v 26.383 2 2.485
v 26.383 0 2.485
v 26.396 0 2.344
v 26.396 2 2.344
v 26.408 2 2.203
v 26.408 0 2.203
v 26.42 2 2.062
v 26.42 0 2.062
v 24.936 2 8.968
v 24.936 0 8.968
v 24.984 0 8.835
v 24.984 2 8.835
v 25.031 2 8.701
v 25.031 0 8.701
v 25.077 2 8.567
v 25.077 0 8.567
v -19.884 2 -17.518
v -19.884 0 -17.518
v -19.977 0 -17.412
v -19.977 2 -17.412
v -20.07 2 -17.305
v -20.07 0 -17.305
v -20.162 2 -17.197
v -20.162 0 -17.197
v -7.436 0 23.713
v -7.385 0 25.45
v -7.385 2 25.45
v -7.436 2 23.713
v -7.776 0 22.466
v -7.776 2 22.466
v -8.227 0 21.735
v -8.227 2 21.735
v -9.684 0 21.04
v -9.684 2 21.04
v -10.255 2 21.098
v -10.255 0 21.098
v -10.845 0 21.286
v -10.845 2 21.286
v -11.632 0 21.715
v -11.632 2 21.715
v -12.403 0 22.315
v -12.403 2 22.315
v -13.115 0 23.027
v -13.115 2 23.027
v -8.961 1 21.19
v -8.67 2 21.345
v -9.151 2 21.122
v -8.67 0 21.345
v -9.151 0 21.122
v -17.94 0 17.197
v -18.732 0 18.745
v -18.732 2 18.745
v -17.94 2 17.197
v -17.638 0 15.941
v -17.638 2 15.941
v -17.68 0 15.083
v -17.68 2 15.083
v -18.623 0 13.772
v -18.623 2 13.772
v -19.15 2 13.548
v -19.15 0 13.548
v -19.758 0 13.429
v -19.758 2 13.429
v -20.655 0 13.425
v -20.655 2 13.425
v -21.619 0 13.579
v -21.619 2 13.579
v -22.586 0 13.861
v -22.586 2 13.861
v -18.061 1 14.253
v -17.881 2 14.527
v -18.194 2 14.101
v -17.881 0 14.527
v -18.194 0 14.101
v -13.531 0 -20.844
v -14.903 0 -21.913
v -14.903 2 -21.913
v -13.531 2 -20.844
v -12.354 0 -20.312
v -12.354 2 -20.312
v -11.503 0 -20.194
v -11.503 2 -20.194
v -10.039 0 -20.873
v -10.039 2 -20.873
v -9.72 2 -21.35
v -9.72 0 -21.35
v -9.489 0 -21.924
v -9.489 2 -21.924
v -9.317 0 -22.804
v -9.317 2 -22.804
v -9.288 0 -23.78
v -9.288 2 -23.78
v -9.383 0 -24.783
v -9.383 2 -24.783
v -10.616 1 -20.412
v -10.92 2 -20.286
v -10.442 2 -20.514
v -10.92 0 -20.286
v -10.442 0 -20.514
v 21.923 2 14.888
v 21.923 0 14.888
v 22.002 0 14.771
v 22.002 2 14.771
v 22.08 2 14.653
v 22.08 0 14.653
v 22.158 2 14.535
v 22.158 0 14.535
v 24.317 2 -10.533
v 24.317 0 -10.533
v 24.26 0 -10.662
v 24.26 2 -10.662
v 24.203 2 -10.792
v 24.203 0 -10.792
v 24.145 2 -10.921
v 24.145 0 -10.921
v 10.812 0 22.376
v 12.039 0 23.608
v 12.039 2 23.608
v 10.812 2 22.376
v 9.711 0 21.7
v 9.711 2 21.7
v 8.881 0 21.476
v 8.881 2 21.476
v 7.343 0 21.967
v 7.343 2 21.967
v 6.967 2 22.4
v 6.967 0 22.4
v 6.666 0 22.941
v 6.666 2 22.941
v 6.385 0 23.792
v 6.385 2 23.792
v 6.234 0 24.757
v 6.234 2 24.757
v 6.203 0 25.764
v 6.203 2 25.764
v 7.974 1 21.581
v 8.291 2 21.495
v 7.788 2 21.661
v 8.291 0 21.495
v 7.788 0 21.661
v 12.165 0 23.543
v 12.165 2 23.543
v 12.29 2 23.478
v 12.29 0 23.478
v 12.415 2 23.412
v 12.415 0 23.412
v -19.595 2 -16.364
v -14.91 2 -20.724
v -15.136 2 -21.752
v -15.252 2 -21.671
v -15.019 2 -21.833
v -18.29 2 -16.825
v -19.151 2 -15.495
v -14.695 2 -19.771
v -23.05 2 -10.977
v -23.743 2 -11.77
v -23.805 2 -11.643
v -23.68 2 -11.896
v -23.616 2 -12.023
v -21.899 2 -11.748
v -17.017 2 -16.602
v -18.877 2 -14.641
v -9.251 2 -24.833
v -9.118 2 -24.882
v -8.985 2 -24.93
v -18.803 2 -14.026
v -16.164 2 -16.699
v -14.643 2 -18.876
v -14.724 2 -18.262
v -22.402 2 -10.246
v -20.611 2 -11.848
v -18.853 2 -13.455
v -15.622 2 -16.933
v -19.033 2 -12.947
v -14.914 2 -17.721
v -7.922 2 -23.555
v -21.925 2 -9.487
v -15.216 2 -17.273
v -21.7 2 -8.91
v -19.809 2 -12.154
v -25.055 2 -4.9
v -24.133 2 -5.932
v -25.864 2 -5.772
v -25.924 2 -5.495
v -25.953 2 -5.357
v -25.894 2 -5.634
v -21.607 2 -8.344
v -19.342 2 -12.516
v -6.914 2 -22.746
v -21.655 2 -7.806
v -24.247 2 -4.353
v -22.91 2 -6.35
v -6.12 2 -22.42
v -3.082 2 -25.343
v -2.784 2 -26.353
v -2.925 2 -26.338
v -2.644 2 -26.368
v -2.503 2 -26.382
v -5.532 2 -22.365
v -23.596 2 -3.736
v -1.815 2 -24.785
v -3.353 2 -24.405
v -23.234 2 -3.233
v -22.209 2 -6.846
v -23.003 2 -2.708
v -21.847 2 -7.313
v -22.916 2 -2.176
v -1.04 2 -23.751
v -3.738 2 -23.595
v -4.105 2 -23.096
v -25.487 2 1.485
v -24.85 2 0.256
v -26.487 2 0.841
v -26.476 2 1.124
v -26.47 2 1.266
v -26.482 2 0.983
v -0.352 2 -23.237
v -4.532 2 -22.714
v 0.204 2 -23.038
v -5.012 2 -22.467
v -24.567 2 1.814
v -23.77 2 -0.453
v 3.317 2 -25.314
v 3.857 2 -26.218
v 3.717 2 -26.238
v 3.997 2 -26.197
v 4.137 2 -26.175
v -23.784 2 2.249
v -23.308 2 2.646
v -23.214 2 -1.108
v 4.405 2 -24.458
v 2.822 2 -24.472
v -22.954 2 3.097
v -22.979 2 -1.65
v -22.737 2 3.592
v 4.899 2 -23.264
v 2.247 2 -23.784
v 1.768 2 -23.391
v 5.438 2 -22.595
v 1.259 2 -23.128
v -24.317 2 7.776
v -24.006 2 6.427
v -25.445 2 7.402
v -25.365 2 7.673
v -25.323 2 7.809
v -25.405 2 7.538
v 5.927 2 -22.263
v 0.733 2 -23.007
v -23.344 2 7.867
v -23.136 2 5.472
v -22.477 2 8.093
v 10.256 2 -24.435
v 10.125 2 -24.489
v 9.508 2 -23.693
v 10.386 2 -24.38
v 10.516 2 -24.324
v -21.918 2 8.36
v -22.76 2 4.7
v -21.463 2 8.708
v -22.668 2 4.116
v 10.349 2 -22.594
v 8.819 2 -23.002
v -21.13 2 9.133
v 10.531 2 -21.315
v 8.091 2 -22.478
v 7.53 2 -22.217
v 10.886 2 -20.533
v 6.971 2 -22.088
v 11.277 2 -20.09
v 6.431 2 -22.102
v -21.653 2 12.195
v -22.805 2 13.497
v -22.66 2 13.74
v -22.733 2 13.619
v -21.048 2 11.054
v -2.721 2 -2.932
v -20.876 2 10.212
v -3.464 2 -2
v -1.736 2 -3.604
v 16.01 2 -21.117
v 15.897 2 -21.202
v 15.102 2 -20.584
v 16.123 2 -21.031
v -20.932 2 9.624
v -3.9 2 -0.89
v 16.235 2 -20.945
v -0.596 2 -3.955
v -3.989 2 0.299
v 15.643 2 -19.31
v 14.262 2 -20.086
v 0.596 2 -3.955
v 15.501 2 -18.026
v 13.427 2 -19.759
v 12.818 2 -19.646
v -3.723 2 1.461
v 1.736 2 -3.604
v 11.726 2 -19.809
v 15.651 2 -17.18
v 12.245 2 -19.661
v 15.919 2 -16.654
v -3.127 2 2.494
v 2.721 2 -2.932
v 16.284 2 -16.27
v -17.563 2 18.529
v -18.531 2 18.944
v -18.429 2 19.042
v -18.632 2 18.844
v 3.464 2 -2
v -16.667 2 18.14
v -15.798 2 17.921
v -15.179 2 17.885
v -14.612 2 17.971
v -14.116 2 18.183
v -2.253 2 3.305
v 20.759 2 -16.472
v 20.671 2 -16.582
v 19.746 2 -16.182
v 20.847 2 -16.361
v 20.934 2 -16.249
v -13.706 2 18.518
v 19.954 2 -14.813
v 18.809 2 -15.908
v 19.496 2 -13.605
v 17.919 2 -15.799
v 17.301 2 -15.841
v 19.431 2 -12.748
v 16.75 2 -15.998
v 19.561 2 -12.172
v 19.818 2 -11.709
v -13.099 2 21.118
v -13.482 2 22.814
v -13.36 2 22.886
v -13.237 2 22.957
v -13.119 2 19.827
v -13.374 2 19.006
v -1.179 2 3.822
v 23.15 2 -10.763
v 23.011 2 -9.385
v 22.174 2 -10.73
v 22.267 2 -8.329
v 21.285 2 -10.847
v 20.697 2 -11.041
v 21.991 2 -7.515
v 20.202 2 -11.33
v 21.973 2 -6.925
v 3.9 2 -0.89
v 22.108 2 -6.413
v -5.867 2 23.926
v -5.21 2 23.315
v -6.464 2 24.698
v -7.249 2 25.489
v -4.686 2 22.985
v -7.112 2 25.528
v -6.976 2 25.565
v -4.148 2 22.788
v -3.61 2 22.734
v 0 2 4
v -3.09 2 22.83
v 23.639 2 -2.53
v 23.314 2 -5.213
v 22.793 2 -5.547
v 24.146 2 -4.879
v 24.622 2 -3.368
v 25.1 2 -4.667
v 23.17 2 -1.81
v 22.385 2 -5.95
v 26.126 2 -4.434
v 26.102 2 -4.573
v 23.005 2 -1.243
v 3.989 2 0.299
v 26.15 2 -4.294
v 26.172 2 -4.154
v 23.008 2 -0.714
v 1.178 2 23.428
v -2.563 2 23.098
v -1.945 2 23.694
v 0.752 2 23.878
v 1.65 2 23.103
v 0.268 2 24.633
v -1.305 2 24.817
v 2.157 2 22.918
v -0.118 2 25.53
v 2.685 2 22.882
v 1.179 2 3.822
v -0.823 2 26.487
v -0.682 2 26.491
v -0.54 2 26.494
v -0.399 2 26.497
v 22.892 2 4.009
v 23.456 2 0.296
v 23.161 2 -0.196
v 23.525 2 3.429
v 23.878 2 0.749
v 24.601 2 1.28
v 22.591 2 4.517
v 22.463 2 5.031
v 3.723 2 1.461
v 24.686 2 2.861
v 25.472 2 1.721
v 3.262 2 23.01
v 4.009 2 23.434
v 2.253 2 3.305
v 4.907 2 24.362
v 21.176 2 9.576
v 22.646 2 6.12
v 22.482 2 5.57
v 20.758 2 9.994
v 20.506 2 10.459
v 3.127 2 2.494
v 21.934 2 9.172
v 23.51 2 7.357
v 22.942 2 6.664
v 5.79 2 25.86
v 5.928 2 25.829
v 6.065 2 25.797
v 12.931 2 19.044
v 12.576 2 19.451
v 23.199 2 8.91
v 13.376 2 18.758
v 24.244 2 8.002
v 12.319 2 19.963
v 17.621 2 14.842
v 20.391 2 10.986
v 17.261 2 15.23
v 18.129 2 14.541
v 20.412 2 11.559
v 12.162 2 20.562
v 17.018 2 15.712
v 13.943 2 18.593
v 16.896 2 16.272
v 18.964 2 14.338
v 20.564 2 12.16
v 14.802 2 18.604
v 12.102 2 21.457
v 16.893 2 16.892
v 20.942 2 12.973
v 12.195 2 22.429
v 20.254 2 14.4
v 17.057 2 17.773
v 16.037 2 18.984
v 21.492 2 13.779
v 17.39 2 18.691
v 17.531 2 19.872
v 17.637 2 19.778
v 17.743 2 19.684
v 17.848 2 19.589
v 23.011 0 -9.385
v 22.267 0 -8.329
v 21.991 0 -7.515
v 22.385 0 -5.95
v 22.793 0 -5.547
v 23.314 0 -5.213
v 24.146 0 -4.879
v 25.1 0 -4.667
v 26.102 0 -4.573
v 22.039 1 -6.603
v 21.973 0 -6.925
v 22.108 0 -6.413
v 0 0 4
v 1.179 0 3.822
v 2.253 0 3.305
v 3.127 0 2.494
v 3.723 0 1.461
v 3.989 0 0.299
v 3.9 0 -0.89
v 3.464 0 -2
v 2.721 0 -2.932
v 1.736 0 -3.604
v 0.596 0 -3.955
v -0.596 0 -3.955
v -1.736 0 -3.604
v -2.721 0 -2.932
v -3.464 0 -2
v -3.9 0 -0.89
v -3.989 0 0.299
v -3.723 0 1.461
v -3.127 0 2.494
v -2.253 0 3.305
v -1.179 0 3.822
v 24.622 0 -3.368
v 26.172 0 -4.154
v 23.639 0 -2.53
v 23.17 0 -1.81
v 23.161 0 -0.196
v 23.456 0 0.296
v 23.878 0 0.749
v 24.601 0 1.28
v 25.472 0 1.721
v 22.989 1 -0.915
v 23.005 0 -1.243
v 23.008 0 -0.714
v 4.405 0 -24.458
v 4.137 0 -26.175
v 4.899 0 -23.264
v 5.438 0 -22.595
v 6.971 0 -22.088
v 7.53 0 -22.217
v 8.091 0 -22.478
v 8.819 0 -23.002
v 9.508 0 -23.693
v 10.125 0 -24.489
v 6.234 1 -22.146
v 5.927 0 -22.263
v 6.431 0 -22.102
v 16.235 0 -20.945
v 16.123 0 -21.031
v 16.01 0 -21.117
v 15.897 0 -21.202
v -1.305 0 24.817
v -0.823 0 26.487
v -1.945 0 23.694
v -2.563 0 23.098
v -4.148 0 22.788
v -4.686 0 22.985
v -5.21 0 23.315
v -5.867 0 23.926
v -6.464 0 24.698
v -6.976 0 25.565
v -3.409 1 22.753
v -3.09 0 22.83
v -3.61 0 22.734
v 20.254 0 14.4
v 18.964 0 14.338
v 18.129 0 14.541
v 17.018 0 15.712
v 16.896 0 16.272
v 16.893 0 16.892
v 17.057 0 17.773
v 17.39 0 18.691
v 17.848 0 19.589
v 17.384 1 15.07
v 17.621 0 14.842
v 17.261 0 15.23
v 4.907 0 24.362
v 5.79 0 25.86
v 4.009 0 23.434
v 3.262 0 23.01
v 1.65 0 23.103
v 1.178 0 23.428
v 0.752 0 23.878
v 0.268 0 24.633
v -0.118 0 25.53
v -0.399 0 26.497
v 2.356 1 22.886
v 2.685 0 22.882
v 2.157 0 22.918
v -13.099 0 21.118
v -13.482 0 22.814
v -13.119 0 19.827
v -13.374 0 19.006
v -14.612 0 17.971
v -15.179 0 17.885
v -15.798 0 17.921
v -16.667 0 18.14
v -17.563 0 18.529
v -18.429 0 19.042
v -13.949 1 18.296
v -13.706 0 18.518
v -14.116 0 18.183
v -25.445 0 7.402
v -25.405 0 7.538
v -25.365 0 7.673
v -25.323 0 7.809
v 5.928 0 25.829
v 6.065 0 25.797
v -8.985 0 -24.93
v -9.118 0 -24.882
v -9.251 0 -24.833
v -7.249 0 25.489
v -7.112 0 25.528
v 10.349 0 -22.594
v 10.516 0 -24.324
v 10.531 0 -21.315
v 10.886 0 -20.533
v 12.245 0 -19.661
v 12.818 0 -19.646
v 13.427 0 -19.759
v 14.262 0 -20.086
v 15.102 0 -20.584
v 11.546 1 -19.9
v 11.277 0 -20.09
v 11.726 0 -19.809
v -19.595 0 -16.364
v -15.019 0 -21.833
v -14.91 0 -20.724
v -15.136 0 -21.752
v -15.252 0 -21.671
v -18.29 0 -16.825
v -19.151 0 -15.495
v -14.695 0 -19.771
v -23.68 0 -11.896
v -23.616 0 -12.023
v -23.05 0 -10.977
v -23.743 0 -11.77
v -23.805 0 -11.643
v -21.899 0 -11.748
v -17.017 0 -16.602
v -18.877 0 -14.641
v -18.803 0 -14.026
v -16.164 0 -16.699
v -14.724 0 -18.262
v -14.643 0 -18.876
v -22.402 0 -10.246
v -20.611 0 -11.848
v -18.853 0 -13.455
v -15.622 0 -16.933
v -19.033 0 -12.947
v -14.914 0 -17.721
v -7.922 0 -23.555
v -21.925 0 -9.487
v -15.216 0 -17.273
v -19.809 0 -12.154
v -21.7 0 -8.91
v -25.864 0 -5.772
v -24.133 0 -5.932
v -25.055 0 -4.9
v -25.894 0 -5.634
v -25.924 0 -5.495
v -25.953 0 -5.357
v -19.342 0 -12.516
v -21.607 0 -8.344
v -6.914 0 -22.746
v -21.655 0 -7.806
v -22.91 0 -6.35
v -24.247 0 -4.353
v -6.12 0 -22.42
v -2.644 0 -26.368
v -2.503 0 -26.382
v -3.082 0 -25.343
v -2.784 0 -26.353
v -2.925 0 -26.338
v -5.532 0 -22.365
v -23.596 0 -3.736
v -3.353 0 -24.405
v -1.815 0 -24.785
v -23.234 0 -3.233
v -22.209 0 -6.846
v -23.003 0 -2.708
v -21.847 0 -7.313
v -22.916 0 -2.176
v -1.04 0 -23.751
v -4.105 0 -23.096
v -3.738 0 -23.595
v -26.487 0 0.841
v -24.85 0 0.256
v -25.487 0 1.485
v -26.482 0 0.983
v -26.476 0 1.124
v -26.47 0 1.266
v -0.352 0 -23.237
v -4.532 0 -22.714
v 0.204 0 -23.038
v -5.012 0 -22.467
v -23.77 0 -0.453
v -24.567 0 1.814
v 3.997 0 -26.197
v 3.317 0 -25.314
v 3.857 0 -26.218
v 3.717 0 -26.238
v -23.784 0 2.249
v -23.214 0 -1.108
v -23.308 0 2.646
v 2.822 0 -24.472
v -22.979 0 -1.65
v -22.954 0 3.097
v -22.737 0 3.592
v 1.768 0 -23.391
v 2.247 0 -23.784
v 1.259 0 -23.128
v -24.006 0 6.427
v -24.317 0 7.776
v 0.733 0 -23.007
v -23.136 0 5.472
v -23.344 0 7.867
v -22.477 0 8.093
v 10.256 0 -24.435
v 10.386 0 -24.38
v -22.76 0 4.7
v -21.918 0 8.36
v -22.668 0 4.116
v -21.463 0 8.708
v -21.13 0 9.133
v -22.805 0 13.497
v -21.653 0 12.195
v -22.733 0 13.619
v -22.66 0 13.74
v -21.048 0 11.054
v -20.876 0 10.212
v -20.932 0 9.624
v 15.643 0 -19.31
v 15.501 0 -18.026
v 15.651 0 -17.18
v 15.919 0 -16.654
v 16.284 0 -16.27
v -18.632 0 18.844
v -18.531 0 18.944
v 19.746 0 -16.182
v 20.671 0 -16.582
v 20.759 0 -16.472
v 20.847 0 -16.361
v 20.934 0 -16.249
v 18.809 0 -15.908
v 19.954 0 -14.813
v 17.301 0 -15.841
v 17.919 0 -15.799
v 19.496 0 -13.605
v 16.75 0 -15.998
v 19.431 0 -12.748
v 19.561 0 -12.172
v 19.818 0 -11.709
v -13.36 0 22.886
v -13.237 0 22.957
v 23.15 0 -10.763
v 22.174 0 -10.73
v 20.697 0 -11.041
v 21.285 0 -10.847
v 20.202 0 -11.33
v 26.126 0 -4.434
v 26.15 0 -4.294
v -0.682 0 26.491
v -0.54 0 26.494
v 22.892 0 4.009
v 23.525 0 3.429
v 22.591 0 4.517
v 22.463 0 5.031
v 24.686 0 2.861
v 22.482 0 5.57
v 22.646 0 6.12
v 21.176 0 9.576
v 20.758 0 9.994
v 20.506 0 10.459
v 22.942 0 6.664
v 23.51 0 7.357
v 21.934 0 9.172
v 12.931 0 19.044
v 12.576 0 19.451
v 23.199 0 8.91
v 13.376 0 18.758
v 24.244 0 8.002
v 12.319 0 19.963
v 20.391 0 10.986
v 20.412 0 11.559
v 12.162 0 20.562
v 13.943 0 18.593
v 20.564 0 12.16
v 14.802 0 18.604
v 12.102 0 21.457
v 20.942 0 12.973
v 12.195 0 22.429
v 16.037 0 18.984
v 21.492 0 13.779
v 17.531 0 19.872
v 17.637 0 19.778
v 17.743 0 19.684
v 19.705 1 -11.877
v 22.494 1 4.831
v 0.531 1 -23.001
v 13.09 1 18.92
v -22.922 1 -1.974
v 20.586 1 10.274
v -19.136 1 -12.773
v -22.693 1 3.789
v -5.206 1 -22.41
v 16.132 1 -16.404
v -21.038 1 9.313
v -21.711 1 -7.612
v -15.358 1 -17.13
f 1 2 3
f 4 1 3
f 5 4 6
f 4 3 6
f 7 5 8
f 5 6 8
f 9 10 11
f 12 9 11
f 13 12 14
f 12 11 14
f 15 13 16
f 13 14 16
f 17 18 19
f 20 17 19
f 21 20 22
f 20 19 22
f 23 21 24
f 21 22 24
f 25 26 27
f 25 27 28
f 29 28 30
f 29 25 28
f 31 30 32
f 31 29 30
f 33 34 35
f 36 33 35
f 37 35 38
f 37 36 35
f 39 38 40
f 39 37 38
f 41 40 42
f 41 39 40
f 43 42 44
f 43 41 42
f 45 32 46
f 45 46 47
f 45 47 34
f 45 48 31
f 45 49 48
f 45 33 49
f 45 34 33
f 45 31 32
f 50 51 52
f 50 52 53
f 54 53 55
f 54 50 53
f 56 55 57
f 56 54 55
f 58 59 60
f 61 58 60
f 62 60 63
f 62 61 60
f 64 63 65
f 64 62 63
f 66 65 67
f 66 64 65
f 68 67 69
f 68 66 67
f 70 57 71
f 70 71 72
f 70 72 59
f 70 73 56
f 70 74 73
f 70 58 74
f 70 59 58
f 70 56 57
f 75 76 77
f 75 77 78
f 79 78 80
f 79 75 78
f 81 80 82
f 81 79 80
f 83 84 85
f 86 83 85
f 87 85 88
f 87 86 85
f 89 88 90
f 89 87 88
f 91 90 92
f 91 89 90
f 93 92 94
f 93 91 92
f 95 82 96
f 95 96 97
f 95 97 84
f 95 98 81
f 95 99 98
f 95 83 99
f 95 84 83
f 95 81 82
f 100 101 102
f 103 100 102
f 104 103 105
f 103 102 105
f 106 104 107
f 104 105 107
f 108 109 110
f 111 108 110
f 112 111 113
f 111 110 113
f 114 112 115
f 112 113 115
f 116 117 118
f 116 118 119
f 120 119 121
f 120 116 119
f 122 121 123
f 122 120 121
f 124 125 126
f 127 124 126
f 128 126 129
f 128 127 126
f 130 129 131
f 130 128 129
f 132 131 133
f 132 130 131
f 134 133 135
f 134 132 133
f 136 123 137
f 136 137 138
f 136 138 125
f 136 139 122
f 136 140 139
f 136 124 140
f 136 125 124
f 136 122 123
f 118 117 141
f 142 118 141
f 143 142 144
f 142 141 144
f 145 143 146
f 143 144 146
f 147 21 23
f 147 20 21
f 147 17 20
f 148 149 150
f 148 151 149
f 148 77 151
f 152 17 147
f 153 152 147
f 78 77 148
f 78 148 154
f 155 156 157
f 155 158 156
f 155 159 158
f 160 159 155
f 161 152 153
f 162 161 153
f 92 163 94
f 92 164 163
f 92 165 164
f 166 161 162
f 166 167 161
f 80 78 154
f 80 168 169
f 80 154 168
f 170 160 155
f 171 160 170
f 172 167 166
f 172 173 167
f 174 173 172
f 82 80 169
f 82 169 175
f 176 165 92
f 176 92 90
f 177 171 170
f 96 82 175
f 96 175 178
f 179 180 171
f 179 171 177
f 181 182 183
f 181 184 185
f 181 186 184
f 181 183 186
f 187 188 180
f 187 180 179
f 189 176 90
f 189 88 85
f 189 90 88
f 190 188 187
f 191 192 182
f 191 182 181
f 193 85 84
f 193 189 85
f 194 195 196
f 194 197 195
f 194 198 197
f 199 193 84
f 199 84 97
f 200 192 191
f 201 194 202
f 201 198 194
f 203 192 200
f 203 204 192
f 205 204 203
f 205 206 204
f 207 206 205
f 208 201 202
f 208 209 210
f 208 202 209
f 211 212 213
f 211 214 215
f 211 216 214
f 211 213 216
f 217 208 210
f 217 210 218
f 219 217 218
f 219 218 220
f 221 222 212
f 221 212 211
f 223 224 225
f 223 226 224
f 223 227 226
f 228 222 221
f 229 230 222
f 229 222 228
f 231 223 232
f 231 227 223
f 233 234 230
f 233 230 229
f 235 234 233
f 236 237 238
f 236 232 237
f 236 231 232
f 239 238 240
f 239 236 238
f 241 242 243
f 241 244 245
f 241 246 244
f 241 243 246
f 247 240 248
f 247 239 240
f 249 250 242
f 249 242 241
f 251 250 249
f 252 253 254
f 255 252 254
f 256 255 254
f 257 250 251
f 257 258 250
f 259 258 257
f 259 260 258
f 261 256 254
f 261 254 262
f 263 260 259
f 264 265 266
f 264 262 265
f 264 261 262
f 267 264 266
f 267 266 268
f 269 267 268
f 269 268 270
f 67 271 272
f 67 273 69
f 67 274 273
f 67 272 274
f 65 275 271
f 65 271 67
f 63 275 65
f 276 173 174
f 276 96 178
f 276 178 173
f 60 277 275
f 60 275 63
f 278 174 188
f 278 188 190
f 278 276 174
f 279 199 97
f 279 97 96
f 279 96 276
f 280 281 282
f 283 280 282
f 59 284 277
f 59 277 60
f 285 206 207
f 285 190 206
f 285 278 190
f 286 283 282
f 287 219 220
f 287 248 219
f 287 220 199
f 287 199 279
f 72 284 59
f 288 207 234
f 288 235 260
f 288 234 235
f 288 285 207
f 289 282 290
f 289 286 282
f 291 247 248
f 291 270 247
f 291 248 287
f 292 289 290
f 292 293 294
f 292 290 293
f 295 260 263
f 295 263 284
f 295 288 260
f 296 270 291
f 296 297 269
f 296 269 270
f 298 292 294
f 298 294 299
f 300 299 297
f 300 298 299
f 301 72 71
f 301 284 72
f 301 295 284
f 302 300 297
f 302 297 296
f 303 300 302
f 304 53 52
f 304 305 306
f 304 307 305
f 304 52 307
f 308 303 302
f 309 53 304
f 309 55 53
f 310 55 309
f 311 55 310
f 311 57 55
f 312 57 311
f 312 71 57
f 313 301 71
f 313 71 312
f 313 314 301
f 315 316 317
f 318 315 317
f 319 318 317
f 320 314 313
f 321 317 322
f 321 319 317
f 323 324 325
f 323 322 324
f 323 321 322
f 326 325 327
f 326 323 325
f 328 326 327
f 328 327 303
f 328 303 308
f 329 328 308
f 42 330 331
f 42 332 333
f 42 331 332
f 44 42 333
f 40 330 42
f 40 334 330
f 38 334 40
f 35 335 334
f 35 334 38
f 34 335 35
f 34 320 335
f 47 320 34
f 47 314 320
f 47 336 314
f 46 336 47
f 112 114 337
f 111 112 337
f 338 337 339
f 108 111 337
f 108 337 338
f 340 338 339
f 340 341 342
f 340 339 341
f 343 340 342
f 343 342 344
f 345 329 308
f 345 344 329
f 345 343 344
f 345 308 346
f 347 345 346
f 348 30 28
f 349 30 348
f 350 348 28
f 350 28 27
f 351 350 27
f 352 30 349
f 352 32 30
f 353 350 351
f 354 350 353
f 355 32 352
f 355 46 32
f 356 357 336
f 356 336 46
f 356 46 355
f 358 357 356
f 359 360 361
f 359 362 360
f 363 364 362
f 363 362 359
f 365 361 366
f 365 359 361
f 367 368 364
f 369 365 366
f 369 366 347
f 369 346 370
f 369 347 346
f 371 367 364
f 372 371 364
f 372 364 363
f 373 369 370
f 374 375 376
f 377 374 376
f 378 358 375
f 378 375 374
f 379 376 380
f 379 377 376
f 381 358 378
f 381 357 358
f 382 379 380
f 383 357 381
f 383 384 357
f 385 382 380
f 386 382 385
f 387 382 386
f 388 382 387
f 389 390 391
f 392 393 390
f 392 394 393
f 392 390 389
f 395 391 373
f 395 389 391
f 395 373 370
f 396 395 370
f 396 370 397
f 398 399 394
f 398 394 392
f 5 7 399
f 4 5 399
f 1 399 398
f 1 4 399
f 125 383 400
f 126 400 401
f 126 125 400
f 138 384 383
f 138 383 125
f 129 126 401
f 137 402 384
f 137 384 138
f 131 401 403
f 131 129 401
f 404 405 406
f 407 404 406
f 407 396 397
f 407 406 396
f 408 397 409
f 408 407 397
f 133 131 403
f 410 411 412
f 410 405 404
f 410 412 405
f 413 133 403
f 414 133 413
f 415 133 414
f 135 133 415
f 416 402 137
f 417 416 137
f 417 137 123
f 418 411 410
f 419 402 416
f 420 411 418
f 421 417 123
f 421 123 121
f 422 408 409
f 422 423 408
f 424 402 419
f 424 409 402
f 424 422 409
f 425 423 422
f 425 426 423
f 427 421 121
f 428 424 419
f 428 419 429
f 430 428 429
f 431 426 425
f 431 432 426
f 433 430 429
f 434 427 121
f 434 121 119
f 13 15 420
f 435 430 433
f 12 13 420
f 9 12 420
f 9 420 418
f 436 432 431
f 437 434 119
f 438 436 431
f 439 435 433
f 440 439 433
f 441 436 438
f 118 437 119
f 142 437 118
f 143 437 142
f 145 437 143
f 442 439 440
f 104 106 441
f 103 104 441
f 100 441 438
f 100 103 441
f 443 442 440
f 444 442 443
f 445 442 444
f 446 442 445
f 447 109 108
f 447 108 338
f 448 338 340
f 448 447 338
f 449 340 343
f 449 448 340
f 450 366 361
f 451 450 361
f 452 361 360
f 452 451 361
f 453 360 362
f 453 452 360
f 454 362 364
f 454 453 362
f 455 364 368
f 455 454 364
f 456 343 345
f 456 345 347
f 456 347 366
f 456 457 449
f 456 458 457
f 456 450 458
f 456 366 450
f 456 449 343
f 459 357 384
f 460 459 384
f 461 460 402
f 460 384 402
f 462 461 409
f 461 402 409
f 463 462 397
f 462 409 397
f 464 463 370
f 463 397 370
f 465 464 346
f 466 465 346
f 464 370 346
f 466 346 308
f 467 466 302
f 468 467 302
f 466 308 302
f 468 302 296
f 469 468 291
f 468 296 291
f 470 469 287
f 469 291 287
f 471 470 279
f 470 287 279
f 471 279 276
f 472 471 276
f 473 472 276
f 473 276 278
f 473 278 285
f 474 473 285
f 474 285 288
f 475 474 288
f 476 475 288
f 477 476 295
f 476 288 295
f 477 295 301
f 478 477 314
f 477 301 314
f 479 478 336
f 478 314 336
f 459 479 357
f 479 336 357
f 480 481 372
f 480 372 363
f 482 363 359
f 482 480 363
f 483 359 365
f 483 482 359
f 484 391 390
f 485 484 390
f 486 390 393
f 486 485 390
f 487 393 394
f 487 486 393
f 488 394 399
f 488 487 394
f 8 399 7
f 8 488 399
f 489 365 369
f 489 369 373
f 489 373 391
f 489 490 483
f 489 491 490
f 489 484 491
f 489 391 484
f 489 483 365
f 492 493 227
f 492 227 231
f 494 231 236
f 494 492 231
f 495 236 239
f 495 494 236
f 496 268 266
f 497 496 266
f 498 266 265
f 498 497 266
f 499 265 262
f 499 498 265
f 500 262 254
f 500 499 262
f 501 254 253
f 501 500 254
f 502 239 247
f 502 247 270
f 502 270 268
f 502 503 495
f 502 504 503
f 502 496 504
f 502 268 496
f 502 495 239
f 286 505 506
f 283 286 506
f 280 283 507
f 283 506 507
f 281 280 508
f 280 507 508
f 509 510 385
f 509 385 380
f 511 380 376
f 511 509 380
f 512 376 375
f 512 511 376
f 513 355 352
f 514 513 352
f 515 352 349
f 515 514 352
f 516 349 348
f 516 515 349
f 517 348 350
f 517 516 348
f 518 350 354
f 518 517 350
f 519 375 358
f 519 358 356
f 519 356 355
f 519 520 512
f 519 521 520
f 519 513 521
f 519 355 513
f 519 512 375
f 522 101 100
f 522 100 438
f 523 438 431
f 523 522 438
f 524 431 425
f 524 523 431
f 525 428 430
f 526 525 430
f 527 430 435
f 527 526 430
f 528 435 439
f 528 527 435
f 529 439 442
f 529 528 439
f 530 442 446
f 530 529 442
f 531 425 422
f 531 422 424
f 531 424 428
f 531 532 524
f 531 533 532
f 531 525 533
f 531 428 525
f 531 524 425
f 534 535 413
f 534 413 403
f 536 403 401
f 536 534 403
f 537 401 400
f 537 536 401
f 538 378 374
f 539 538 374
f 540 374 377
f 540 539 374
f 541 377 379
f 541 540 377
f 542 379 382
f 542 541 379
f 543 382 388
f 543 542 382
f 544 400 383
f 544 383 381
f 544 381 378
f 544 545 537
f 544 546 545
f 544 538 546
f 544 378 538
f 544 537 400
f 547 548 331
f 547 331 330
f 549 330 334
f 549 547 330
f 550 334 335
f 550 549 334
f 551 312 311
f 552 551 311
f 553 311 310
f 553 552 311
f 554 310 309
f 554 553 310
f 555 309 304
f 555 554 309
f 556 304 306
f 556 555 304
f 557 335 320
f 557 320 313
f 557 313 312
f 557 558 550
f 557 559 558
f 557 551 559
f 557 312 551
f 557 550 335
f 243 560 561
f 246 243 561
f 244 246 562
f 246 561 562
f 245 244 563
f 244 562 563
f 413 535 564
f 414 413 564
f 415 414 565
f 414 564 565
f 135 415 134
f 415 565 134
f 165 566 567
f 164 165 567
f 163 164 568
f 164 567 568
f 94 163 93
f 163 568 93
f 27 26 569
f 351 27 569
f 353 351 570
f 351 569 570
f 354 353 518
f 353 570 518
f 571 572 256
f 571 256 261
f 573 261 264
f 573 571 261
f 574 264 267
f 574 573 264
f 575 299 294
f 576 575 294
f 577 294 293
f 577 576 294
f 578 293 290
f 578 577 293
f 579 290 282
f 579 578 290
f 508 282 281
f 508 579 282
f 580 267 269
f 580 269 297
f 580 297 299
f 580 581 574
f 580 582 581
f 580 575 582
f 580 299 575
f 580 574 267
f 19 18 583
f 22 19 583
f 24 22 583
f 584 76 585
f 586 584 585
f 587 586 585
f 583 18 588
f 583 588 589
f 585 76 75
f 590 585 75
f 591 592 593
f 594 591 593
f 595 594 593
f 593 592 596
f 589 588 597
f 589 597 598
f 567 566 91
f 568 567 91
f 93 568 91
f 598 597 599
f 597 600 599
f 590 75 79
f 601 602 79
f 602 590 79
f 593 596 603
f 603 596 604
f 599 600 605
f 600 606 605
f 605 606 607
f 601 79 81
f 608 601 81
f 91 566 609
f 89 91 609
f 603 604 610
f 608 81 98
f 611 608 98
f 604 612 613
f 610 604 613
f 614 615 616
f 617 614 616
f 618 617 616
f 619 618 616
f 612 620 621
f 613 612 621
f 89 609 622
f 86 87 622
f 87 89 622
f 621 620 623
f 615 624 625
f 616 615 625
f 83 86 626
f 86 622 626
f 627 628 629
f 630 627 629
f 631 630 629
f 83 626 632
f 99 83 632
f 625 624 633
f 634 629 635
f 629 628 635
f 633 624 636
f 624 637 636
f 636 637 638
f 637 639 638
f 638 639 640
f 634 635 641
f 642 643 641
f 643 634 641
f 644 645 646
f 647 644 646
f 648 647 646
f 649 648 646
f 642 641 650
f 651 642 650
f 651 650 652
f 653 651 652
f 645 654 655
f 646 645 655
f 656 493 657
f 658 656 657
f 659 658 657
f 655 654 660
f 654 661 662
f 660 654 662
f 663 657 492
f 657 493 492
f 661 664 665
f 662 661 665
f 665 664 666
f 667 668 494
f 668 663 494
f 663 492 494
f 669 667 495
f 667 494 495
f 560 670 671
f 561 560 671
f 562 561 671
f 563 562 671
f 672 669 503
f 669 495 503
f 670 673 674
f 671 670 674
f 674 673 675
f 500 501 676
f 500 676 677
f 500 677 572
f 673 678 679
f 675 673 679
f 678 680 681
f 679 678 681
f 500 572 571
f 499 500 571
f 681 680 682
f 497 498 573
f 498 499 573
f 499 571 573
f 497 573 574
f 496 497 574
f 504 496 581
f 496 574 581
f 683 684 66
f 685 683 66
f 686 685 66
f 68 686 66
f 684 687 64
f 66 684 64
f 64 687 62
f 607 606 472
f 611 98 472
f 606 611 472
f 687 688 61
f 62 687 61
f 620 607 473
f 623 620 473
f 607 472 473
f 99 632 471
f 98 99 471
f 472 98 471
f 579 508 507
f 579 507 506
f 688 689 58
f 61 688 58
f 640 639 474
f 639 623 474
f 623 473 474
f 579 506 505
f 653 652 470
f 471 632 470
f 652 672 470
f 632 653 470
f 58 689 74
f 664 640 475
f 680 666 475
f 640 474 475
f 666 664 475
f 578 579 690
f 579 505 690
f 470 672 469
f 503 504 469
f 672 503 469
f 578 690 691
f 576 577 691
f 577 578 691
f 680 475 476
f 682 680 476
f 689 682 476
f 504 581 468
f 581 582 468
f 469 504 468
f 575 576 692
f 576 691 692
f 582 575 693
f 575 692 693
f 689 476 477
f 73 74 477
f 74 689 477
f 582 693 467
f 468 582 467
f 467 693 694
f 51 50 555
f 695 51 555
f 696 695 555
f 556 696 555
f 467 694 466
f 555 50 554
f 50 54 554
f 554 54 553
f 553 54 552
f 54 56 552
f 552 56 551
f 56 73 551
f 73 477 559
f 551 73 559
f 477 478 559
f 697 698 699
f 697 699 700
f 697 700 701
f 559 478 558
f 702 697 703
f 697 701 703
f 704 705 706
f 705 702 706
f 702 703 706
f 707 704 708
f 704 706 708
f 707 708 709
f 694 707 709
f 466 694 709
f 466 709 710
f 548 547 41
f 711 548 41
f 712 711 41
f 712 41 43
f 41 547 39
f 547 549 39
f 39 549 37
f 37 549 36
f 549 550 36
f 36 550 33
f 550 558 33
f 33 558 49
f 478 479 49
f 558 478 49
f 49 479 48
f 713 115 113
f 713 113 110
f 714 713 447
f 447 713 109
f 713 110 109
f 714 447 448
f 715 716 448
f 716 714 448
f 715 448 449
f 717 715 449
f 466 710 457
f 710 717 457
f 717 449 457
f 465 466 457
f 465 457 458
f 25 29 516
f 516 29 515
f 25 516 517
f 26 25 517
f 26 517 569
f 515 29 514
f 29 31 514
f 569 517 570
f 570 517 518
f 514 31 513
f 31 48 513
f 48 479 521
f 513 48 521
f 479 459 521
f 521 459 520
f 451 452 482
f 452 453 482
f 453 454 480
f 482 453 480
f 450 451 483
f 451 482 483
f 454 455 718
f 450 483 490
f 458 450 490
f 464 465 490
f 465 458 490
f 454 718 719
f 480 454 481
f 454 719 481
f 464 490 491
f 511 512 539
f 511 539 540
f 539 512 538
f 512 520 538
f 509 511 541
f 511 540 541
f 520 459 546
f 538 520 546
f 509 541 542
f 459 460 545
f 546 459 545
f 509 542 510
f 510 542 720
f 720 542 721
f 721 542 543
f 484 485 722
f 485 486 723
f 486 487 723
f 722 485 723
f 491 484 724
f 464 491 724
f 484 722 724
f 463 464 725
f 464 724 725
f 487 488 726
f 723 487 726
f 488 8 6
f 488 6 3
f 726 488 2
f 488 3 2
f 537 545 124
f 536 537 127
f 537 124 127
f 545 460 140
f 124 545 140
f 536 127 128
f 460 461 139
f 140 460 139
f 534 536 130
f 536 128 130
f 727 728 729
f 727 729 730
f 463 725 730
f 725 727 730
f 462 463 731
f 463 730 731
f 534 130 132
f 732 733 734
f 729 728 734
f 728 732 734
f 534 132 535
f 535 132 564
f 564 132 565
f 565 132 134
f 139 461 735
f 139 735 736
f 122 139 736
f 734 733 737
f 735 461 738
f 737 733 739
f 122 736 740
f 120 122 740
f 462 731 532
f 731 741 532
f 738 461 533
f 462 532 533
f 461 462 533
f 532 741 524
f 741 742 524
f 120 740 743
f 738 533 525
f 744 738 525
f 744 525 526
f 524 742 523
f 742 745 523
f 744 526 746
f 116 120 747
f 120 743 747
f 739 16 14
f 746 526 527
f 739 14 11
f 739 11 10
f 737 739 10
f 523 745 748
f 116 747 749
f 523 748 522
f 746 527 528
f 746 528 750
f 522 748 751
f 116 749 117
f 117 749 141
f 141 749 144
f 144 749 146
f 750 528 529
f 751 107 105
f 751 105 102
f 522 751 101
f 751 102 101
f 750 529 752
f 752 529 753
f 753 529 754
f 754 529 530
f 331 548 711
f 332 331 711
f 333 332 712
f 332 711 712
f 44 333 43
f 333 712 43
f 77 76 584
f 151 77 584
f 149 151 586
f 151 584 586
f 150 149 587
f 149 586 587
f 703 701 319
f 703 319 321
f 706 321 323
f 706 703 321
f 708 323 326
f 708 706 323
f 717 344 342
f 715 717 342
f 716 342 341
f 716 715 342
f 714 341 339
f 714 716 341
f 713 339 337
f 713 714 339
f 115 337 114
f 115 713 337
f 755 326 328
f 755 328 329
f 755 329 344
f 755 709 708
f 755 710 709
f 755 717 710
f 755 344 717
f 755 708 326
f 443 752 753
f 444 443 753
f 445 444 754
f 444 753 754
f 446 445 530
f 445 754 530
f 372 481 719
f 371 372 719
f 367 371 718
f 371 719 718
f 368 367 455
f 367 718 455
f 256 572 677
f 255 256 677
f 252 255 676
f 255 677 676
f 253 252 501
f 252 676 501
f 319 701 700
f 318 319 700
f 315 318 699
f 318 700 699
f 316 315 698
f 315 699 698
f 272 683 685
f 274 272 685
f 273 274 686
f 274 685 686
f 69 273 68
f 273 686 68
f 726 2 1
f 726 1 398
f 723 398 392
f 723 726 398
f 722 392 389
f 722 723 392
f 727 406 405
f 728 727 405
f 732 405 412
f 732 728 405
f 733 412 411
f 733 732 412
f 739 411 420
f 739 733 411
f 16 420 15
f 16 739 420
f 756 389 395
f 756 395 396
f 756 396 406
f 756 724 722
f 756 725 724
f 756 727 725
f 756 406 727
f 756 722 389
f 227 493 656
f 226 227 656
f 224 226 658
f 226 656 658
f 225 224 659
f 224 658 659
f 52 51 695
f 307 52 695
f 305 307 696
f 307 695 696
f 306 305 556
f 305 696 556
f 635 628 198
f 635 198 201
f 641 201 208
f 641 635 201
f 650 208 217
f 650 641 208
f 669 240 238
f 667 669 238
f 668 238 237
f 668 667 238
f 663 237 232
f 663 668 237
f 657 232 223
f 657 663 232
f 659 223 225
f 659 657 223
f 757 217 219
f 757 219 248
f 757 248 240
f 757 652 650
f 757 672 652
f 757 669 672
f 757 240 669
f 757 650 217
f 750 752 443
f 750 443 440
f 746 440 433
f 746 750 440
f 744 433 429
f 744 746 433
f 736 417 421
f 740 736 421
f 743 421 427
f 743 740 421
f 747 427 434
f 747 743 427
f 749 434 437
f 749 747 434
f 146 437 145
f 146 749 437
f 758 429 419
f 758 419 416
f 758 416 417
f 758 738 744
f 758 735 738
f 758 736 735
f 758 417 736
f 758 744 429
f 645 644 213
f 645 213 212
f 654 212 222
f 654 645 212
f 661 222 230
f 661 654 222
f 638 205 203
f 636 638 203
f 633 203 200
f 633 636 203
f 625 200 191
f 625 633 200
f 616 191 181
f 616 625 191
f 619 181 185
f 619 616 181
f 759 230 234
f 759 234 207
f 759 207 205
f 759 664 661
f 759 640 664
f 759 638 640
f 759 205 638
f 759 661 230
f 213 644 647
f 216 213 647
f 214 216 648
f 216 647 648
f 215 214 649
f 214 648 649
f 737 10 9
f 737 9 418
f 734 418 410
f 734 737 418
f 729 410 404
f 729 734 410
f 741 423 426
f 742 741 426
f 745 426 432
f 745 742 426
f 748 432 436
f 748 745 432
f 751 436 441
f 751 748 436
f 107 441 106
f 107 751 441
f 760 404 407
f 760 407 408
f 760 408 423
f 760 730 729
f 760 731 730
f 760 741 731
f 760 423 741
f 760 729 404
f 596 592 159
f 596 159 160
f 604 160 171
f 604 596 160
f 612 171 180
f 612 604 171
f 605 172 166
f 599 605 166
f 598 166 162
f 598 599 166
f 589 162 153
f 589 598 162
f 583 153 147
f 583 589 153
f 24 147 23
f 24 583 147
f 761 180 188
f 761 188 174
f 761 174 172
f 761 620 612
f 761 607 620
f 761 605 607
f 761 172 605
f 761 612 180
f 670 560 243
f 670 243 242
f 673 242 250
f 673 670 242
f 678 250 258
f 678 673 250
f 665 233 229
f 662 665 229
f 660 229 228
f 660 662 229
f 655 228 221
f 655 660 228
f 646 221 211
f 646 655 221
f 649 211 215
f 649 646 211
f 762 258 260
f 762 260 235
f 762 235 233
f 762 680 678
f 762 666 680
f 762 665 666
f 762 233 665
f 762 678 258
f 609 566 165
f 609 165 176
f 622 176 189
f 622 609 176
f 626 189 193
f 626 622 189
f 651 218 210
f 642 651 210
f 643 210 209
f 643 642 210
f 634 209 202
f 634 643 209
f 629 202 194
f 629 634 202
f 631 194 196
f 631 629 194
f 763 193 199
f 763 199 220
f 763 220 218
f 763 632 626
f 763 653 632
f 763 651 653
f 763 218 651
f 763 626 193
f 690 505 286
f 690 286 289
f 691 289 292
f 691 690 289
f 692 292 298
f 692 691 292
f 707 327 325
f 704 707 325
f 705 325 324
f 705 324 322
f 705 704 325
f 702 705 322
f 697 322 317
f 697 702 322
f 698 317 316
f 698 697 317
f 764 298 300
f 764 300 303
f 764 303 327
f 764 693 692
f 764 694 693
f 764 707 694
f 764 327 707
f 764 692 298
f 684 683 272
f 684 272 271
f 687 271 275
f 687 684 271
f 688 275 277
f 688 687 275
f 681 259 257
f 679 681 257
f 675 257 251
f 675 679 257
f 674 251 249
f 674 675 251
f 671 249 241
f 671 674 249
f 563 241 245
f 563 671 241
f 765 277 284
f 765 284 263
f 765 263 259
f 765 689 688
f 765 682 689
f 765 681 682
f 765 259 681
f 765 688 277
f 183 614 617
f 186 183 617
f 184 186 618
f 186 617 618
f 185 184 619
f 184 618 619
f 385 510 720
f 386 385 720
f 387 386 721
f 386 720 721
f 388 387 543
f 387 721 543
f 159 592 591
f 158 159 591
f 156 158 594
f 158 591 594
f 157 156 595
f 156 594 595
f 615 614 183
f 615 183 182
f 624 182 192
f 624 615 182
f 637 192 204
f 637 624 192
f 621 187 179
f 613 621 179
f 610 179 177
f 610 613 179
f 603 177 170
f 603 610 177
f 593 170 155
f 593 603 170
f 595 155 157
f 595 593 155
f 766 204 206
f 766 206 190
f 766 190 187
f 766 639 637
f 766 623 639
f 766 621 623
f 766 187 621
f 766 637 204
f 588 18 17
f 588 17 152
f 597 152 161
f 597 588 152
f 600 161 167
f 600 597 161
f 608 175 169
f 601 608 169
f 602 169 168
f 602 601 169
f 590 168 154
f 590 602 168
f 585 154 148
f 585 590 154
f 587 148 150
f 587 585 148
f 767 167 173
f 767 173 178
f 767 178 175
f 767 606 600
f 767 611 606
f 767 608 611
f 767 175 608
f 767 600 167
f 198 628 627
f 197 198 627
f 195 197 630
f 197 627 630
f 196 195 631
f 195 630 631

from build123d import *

# Parameters (mm, degrees)
SKETCH1_R           = 26.5
BOSS_EXTRUDE1_DEPTH = 2
CUT_EXTRUDE1_START  = -2
CUT_EXTRUDE1_DEPTH  = 2
CIRPATTERN2_COUNT   = 25
SKETCH4_R           = 4
CUT_EXTRUDE2_DEPTH  = 2


with BuildPart() as part:
    # Sketch1 → Boss-Extrude1 (new body)
    with BuildSketch(Plane(origin=(0, 0, 0), x_dir=(1, 0, 0), z_dir=(0, 1, 0))):
        with Locations(Location((0, 0, 0), (0, 0, 270))):
            Circle(SKETCH1_R)
    extrude(amount=BOSS_EXTRUDE1_DEPTH)

    # Sketch2 → Cut-Extrude1 (cut)
    with BuildSketch(Plane(origin=(0, 2, 0), x_dir=(1, 0, 0), z_dir=(0, 1, 0)).offset(CUT_EXTRUDE1_START)):
        with BuildLine():
            ThreePointArc((20.67056927, 16.582447529), (18.581221902, 18.894131169), (16.234972011, 20.944586026))
            add(Edge.make_bspline(
                [(16.234972011, 20.944586026), (12.135241932, 12.33960038), (20.67056927, 16.582447529)],
                knots=[0, 0, 0, 1, 1, 1], degree=2, weights=[1, 0.580612476, 1]))
        make_face()
    cut_extrude1 = extrude(amount=CUT_EXTRUDE1_DEPTH, mode=Mode.SUBTRACT)

    # CirPattern2: Cut-Extrude1 ×25 about axis
    cirpattern2_axis = Axis((0, 2, 0), (0, -1, 0))
    for i in range(1, CIRPATTERN2_COUNT):
        add(cut_extrude1.rotate(cirpattern2_axis, i * 360 / CIRPATTERN2_COUNT), mode=Mode.SUBTRACT)

    # Sketch4 → Cut-Extrude2 (cut)
    with BuildSketch(Plane(origin=(0, 2, 0), x_dir=(1, 0, 0), z_dir=(0, 1, 0))):
        with Locations(Location((0, 0, 0), (0, 0, 270))):
            Circle(SKETCH4_R)
    extrude(amount=-CUT_EXTRUDE2_DEPTH, mode=Mode.SUBTRACT)


solid = part.part
